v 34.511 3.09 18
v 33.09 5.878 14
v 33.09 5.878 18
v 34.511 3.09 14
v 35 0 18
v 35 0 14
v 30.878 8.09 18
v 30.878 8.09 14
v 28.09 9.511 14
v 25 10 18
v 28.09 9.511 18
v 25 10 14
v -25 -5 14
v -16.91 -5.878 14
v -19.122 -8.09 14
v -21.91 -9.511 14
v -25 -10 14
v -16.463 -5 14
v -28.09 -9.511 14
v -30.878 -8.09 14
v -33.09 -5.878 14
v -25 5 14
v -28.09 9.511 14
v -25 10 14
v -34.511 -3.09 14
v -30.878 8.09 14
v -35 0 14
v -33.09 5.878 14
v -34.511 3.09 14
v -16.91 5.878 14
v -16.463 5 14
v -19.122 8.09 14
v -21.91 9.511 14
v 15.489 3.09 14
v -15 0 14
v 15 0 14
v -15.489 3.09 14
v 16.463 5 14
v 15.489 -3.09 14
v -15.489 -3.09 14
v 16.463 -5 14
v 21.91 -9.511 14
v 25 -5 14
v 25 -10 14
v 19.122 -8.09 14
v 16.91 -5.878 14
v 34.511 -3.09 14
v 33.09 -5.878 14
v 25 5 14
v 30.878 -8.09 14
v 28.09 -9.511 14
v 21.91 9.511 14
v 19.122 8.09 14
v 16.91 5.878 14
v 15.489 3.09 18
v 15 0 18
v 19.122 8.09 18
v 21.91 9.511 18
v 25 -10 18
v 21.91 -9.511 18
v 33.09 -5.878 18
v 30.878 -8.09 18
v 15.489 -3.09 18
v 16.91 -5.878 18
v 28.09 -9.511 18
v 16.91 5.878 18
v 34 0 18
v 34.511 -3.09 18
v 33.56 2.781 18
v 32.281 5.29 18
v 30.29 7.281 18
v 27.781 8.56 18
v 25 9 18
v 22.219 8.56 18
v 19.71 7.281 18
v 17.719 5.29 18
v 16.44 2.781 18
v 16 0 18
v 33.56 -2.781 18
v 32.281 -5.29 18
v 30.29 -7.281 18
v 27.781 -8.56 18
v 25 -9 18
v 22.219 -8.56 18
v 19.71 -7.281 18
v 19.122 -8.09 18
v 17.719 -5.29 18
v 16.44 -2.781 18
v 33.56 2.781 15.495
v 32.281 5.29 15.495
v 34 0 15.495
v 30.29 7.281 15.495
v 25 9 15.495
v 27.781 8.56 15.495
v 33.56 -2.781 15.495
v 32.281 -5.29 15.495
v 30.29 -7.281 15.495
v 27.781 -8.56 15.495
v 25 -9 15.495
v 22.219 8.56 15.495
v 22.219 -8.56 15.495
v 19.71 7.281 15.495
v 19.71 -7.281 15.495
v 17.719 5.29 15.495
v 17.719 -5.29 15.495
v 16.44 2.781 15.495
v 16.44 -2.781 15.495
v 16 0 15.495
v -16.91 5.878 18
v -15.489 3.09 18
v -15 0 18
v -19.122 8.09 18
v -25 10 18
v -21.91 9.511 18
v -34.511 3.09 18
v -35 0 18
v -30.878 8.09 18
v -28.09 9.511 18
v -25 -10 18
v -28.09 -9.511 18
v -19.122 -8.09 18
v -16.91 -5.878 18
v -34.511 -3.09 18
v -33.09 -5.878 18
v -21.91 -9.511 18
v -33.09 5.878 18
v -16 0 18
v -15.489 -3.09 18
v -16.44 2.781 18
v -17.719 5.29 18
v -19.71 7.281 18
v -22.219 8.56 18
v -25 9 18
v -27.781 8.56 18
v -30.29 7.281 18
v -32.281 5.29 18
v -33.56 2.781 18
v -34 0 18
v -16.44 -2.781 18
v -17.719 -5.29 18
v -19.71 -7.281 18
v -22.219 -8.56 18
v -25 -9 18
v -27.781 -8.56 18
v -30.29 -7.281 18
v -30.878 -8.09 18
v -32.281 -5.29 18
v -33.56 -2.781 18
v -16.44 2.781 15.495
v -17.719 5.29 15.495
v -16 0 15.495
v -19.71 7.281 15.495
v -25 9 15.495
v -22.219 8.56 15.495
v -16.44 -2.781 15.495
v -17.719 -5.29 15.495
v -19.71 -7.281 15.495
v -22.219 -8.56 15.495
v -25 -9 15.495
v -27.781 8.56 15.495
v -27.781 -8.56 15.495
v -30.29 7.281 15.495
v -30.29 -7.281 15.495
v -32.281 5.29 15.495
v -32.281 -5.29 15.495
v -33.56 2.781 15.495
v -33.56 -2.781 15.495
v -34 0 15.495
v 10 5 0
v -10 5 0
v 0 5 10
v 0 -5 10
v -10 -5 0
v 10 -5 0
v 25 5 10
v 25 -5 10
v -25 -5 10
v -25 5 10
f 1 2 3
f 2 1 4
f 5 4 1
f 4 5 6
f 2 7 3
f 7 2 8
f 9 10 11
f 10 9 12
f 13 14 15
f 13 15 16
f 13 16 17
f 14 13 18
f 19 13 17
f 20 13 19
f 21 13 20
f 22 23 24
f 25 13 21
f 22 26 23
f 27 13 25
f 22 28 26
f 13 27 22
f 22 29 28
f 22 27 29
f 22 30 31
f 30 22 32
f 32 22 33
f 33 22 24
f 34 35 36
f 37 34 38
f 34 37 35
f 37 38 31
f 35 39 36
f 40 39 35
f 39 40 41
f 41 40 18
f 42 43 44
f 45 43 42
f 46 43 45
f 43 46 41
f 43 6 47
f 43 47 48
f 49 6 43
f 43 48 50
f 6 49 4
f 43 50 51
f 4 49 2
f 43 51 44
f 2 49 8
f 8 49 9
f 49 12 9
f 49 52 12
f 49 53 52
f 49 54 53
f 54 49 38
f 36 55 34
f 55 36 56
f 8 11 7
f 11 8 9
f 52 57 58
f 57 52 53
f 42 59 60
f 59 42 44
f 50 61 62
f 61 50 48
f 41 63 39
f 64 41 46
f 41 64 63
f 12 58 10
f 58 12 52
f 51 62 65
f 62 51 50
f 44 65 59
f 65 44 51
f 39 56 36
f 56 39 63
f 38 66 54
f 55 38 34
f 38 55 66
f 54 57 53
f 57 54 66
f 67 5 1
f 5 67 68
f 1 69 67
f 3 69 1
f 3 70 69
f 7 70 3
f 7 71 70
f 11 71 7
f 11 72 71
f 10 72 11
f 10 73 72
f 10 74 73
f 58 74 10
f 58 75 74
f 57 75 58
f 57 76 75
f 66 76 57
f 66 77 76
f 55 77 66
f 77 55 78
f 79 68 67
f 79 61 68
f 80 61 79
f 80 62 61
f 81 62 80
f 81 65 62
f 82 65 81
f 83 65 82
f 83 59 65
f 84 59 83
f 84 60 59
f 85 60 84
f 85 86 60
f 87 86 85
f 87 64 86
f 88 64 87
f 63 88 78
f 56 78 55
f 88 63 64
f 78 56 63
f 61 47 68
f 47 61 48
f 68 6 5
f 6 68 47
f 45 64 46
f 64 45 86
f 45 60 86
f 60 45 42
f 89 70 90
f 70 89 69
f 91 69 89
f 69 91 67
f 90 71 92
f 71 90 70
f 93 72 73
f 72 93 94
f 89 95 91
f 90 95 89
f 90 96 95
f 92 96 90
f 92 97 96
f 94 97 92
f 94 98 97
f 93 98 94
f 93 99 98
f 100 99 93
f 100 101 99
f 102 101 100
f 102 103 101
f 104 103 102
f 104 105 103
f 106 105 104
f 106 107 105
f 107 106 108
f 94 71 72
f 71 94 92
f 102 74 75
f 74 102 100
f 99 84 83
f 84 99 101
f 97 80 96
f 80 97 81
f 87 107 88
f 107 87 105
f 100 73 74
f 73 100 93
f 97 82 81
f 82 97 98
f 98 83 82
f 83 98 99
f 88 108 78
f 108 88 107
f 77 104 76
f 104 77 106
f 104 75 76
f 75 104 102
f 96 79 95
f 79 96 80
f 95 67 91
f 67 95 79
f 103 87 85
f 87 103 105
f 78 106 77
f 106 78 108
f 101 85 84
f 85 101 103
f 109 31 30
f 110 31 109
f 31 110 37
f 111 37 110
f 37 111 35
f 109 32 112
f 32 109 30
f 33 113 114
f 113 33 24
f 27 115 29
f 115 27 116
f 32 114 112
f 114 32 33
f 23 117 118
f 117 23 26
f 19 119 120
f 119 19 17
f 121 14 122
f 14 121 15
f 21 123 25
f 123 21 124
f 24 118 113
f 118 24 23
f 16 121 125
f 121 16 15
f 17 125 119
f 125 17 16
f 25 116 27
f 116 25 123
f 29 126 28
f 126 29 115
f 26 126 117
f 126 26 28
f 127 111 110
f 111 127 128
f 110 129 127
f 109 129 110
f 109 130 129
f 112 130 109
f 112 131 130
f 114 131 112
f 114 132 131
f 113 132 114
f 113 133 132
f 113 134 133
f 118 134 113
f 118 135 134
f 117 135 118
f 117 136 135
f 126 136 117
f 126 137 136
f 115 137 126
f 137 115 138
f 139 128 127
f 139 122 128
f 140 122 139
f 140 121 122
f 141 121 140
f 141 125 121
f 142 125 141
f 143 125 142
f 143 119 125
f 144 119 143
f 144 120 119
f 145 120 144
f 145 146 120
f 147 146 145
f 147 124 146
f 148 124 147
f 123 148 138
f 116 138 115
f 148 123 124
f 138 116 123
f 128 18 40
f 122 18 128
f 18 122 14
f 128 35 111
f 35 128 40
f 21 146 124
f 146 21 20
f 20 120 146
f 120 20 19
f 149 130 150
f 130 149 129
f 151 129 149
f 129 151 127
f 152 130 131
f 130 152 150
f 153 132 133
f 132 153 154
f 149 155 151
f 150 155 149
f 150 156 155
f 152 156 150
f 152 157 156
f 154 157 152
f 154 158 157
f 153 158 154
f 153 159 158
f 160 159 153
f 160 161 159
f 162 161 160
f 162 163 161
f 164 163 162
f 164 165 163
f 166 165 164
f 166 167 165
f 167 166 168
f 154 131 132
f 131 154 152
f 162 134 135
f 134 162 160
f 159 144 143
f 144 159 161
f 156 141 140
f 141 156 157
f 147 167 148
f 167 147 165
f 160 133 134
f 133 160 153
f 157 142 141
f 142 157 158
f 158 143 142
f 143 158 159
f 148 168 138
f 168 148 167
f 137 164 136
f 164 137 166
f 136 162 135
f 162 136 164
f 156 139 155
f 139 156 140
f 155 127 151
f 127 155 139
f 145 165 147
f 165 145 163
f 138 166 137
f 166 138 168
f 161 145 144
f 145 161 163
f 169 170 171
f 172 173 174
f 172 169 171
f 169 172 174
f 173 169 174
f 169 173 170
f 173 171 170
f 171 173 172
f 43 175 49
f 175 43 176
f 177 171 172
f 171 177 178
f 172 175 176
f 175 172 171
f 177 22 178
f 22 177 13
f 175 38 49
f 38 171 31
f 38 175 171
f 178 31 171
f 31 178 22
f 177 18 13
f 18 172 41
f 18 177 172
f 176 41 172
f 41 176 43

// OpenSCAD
PIVOT_HEIGHT=10;
PIVOT_BASE=20;
ARM_LENGTH=50;
ARM_WIDTH=10;
ARM_THICKNESS=4;
CUP_RADIUS=10;
CUP_HEIGHT=4;
CUP_BASE=1;
CUP_INNER_RADIUS=9;

DETAIL=20;

module drawPivot()
{
	translate([-1 * PIVOT_BASE/2,ARM_WIDTH/2,0])
	rotate([90,0,0])
	linear_extrude( height=ARM_WIDTH )
	polygon(points=[[0,0],[PIVOT_BASE,0],[PIVOT_BASE/2,PIVOT_HEIGHT]], paths=[[0,1,2]]);
}

module drawArm()
{
	cube([ARM_LENGTH,ARM_WIDTH,ARM_THICKNESS], center=true);

	// cut out the pivot points
}

module drawCup()
{
	difference()
	{
		cylinder( CUP_HEIGHT, CUP_RADIUS, CUP_RADIUS, center=true, $fn=DETAIL );

		translate([0,0,CUP_BASE])
		cylinder( CUP_HEIGHT-CUP_BASE+0.01, CUP_INNER_RADIUS, CUP_INNER_RADIUS, center=true, $fn=DETAIL );
	}
}

module drawScales()
{
	drawPivot();

	translate([0,0,PIVOT_HEIGHT+ARM_THICKNESS/2])
	drawArm();

	translate([ARM_LENGTH/2,0,PIVOT_HEIGHT+ARM_THICKNESS+CUP_HEIGHT/2])
	drawCup();
	translate([-1*ARM_LENGTH/2,0,PIVOT_HEIGHT+ARM_THICKNESS+CUP_HEIGHT/2])
	drawCup();
}

drawScales();
